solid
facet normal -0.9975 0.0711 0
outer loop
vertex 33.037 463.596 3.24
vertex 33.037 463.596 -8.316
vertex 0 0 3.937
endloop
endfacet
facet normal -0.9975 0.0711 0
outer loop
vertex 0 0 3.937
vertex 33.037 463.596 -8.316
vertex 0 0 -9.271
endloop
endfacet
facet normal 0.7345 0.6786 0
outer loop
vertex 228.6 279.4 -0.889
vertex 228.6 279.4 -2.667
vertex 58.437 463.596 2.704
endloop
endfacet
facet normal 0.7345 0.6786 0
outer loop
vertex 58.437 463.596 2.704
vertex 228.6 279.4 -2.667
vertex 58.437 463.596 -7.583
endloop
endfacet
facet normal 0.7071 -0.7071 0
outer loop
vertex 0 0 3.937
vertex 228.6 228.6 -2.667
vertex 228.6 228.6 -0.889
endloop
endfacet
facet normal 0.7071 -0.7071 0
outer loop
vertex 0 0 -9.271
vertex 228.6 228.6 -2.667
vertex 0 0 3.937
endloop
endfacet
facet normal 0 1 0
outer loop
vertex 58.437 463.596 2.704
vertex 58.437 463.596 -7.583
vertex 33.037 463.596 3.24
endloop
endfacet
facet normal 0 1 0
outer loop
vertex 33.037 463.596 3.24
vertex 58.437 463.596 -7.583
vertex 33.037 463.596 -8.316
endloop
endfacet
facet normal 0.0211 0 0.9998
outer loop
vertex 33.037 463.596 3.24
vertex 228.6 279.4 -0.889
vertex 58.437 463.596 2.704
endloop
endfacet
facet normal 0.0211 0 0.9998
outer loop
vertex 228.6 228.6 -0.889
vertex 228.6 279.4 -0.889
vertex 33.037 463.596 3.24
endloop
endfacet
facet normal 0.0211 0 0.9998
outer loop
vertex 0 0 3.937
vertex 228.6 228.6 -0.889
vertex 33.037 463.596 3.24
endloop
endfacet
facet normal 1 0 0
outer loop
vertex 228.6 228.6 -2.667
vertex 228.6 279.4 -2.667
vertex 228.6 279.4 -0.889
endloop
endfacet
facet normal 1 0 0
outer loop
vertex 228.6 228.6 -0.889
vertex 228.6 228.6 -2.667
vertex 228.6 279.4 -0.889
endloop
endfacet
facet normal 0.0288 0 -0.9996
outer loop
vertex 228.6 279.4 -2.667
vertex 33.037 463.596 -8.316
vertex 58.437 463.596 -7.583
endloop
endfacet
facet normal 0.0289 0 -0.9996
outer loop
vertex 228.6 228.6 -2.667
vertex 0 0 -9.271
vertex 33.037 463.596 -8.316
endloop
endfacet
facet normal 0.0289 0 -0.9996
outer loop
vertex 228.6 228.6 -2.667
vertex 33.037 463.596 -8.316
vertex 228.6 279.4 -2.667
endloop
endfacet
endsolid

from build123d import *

# Parameters (mm, degrees)
BOSS_EXTRUDE1_DEPTH     = 508
CUT_EXTRUDE3_DEPTH      = 558.14262793
CUT_EXTRUDE3_DEPTH_BACK = 558.14262793


with BuildPart() as part:
    # Sketch1 → Boss-Extrude1 (new body)
    with BuildSketch(Plane(origin=(0, 0, 0), x_dir=(1, 0, 0), z_dir=(0, 1, 0))):
        Polygon((0, -3.937193282), (0, 9.270806718), (228.6, 2.666806718), (228.6, 0.888806718), align=None)
    extrude(amount=BOSS_EXTRUDE1_DEPTH)

    # Sketch3 → Cut-Extrude3 (cut, two sides: drawn at the far end of the back side and taken through both)
    with BuildSketch(Plane.XY.offset(-CUT_EXTRUDE3_DEPTH_BACK)):
        Polygon((228.6, 0), (0, 0), (151.300007346, 151.300007346), (228.6, 228.6), align=None)
        Polygon((228.6, 508), (228.6, 279.4), (58.436980759, 463.596176947), (33.036980759, 463.596176947), (0, 0), (0, 508), align=None)
    extrude(amount=CUT_EXTRUDE3_DEPTH + CUT_EXTRUDE3_DEPTH_BACK, mode=Mode.SUBTRACT)


solid = part.part
